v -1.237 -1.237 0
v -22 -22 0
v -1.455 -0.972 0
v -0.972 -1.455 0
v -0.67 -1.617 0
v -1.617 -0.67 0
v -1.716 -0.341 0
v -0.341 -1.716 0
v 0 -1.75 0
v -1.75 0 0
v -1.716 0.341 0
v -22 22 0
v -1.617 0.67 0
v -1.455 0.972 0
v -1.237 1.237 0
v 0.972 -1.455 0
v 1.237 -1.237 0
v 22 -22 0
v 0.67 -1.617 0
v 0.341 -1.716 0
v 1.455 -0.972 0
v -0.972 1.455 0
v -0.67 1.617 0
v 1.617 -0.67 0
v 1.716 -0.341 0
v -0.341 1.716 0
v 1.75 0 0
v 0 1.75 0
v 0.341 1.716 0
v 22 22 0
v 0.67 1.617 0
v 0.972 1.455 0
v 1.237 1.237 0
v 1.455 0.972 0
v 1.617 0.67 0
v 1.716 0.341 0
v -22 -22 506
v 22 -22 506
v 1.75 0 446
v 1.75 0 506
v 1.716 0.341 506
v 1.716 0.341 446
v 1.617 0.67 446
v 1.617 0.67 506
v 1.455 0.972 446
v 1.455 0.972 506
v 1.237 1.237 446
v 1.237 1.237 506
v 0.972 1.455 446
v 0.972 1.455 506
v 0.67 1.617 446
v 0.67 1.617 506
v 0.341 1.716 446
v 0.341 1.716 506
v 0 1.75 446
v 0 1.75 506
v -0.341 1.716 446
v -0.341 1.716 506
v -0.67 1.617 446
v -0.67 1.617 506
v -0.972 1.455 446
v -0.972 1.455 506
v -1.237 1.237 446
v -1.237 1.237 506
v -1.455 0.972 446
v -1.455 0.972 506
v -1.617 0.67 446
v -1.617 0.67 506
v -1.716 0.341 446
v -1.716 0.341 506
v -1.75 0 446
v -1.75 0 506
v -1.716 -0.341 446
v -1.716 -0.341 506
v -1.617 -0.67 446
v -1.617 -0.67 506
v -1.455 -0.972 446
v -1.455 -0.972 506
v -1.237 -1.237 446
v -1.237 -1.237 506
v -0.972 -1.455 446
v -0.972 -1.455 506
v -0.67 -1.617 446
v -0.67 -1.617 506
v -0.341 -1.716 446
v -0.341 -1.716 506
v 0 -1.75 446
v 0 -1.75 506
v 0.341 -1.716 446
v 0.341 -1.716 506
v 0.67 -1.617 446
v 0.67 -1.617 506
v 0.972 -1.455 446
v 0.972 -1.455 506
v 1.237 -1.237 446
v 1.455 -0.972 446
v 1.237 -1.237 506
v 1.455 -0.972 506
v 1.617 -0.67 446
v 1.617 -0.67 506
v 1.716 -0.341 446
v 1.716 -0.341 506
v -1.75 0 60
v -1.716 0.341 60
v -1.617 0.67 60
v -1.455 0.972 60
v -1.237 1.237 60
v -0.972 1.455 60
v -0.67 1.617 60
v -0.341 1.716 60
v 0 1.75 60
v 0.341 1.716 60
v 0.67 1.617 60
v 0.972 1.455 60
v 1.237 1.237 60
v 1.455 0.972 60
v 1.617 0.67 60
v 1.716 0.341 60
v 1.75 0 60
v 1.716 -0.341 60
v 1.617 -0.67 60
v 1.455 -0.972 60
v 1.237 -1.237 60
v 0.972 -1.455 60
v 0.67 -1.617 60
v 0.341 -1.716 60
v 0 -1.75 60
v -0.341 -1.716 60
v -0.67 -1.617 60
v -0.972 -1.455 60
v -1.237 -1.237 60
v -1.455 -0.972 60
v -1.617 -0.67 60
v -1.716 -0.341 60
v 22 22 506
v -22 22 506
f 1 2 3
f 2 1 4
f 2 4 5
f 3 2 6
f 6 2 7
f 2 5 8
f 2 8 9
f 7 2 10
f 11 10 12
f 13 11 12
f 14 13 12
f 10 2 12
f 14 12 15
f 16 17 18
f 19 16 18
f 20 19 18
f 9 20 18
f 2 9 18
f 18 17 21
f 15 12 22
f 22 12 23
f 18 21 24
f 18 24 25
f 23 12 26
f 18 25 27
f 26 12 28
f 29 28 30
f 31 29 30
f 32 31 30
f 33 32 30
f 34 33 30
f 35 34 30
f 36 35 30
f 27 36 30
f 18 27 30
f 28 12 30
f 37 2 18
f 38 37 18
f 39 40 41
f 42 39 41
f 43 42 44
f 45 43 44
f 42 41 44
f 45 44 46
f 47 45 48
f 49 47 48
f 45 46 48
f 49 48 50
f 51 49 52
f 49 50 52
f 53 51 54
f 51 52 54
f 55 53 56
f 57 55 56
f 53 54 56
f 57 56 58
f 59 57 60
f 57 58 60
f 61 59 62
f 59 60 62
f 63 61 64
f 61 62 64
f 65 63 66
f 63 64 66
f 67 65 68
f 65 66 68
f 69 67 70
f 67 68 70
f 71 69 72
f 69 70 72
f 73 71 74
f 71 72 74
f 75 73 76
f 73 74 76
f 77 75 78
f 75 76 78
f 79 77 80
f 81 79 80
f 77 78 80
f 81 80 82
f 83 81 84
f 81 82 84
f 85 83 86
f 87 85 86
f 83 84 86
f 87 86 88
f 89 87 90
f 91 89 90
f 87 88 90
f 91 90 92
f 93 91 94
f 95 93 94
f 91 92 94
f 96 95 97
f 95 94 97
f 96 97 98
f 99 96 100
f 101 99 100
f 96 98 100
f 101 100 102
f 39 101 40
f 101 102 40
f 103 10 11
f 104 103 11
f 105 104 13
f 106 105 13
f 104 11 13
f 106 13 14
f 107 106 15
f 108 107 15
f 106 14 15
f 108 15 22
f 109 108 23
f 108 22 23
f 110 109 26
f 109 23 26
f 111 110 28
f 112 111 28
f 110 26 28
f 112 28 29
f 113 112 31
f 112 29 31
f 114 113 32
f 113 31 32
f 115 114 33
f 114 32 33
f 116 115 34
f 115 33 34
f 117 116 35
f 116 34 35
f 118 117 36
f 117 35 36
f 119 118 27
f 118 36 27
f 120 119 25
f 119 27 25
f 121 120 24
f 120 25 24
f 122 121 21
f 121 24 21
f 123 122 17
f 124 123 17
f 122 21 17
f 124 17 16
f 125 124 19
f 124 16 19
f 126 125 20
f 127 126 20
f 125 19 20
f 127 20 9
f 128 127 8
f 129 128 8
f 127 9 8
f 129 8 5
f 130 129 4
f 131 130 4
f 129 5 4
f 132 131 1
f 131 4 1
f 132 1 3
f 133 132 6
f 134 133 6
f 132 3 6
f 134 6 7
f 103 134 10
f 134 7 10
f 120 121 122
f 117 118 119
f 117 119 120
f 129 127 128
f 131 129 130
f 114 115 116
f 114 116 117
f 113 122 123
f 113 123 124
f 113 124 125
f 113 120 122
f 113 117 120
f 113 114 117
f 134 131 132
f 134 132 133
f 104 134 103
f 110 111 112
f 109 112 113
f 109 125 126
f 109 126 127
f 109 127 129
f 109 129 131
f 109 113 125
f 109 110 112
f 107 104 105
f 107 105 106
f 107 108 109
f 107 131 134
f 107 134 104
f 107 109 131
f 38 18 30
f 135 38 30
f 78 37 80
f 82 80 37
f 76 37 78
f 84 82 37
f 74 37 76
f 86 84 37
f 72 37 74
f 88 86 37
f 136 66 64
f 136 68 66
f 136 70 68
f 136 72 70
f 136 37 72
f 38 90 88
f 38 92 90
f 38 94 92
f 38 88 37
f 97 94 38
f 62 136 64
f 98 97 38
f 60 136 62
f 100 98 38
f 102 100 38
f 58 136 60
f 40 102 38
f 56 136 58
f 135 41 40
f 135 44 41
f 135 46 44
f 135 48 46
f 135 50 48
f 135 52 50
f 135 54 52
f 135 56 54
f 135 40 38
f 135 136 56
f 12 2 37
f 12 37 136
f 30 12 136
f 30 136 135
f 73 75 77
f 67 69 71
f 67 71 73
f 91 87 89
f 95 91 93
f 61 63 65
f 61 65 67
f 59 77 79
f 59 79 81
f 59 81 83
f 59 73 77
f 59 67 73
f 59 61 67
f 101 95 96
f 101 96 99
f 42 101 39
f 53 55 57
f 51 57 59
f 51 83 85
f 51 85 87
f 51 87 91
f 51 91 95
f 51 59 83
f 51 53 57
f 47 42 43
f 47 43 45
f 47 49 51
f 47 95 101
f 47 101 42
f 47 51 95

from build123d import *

# Parameters (mm, degrees)
ESQUISSE1_W             = 44
ESQUISSE1_H             = 44
BOSS_EXTRU_1_DEPTH      = 506
ESQUISSE2_R             = 1.75
ENL_V_MAT_EXTRU_1_DEPTH = 60
ESQUISSE3_R             = 1.75
ENL_V_MAT_EXTRU_2_DEPTH = 60


with BuildPart() as part:
    # Esquisse1 → Boss.-Extru.1 (new body)
    with BuildSketch(Plane.XY):
        Rectangle(ESQUISSE1_W, ESQUISSE1_H)
    extrude(amount=BOSS_EXTRU_1_DEPTH)

    # Esquisse2 → Enlèv. mat.-Extru.1 (cut)
    with BuildSketch(Plane(origin=(0, 0, 0), x_dir=(-1, 0, 0), z_dir=(0, 0, -1))):
        Circle(ESQUISSE2_R)
    extrude(amount=-ENL_V_MAT_EXTRU_1_DEPTH, mode=Mode.SUBTRACT)

    # Esquisse3 → Enlèv. mat.-Extru.2 (cut)
    with BuildSketch(Plane.XY.offset(506)):
        Circle(ESQUISSE3_R)
    extrude(amount=-ENL_V_MAT_EXTRU_2_DEPTH, mode=Mode.SUBTRACT)


solid = part.part
